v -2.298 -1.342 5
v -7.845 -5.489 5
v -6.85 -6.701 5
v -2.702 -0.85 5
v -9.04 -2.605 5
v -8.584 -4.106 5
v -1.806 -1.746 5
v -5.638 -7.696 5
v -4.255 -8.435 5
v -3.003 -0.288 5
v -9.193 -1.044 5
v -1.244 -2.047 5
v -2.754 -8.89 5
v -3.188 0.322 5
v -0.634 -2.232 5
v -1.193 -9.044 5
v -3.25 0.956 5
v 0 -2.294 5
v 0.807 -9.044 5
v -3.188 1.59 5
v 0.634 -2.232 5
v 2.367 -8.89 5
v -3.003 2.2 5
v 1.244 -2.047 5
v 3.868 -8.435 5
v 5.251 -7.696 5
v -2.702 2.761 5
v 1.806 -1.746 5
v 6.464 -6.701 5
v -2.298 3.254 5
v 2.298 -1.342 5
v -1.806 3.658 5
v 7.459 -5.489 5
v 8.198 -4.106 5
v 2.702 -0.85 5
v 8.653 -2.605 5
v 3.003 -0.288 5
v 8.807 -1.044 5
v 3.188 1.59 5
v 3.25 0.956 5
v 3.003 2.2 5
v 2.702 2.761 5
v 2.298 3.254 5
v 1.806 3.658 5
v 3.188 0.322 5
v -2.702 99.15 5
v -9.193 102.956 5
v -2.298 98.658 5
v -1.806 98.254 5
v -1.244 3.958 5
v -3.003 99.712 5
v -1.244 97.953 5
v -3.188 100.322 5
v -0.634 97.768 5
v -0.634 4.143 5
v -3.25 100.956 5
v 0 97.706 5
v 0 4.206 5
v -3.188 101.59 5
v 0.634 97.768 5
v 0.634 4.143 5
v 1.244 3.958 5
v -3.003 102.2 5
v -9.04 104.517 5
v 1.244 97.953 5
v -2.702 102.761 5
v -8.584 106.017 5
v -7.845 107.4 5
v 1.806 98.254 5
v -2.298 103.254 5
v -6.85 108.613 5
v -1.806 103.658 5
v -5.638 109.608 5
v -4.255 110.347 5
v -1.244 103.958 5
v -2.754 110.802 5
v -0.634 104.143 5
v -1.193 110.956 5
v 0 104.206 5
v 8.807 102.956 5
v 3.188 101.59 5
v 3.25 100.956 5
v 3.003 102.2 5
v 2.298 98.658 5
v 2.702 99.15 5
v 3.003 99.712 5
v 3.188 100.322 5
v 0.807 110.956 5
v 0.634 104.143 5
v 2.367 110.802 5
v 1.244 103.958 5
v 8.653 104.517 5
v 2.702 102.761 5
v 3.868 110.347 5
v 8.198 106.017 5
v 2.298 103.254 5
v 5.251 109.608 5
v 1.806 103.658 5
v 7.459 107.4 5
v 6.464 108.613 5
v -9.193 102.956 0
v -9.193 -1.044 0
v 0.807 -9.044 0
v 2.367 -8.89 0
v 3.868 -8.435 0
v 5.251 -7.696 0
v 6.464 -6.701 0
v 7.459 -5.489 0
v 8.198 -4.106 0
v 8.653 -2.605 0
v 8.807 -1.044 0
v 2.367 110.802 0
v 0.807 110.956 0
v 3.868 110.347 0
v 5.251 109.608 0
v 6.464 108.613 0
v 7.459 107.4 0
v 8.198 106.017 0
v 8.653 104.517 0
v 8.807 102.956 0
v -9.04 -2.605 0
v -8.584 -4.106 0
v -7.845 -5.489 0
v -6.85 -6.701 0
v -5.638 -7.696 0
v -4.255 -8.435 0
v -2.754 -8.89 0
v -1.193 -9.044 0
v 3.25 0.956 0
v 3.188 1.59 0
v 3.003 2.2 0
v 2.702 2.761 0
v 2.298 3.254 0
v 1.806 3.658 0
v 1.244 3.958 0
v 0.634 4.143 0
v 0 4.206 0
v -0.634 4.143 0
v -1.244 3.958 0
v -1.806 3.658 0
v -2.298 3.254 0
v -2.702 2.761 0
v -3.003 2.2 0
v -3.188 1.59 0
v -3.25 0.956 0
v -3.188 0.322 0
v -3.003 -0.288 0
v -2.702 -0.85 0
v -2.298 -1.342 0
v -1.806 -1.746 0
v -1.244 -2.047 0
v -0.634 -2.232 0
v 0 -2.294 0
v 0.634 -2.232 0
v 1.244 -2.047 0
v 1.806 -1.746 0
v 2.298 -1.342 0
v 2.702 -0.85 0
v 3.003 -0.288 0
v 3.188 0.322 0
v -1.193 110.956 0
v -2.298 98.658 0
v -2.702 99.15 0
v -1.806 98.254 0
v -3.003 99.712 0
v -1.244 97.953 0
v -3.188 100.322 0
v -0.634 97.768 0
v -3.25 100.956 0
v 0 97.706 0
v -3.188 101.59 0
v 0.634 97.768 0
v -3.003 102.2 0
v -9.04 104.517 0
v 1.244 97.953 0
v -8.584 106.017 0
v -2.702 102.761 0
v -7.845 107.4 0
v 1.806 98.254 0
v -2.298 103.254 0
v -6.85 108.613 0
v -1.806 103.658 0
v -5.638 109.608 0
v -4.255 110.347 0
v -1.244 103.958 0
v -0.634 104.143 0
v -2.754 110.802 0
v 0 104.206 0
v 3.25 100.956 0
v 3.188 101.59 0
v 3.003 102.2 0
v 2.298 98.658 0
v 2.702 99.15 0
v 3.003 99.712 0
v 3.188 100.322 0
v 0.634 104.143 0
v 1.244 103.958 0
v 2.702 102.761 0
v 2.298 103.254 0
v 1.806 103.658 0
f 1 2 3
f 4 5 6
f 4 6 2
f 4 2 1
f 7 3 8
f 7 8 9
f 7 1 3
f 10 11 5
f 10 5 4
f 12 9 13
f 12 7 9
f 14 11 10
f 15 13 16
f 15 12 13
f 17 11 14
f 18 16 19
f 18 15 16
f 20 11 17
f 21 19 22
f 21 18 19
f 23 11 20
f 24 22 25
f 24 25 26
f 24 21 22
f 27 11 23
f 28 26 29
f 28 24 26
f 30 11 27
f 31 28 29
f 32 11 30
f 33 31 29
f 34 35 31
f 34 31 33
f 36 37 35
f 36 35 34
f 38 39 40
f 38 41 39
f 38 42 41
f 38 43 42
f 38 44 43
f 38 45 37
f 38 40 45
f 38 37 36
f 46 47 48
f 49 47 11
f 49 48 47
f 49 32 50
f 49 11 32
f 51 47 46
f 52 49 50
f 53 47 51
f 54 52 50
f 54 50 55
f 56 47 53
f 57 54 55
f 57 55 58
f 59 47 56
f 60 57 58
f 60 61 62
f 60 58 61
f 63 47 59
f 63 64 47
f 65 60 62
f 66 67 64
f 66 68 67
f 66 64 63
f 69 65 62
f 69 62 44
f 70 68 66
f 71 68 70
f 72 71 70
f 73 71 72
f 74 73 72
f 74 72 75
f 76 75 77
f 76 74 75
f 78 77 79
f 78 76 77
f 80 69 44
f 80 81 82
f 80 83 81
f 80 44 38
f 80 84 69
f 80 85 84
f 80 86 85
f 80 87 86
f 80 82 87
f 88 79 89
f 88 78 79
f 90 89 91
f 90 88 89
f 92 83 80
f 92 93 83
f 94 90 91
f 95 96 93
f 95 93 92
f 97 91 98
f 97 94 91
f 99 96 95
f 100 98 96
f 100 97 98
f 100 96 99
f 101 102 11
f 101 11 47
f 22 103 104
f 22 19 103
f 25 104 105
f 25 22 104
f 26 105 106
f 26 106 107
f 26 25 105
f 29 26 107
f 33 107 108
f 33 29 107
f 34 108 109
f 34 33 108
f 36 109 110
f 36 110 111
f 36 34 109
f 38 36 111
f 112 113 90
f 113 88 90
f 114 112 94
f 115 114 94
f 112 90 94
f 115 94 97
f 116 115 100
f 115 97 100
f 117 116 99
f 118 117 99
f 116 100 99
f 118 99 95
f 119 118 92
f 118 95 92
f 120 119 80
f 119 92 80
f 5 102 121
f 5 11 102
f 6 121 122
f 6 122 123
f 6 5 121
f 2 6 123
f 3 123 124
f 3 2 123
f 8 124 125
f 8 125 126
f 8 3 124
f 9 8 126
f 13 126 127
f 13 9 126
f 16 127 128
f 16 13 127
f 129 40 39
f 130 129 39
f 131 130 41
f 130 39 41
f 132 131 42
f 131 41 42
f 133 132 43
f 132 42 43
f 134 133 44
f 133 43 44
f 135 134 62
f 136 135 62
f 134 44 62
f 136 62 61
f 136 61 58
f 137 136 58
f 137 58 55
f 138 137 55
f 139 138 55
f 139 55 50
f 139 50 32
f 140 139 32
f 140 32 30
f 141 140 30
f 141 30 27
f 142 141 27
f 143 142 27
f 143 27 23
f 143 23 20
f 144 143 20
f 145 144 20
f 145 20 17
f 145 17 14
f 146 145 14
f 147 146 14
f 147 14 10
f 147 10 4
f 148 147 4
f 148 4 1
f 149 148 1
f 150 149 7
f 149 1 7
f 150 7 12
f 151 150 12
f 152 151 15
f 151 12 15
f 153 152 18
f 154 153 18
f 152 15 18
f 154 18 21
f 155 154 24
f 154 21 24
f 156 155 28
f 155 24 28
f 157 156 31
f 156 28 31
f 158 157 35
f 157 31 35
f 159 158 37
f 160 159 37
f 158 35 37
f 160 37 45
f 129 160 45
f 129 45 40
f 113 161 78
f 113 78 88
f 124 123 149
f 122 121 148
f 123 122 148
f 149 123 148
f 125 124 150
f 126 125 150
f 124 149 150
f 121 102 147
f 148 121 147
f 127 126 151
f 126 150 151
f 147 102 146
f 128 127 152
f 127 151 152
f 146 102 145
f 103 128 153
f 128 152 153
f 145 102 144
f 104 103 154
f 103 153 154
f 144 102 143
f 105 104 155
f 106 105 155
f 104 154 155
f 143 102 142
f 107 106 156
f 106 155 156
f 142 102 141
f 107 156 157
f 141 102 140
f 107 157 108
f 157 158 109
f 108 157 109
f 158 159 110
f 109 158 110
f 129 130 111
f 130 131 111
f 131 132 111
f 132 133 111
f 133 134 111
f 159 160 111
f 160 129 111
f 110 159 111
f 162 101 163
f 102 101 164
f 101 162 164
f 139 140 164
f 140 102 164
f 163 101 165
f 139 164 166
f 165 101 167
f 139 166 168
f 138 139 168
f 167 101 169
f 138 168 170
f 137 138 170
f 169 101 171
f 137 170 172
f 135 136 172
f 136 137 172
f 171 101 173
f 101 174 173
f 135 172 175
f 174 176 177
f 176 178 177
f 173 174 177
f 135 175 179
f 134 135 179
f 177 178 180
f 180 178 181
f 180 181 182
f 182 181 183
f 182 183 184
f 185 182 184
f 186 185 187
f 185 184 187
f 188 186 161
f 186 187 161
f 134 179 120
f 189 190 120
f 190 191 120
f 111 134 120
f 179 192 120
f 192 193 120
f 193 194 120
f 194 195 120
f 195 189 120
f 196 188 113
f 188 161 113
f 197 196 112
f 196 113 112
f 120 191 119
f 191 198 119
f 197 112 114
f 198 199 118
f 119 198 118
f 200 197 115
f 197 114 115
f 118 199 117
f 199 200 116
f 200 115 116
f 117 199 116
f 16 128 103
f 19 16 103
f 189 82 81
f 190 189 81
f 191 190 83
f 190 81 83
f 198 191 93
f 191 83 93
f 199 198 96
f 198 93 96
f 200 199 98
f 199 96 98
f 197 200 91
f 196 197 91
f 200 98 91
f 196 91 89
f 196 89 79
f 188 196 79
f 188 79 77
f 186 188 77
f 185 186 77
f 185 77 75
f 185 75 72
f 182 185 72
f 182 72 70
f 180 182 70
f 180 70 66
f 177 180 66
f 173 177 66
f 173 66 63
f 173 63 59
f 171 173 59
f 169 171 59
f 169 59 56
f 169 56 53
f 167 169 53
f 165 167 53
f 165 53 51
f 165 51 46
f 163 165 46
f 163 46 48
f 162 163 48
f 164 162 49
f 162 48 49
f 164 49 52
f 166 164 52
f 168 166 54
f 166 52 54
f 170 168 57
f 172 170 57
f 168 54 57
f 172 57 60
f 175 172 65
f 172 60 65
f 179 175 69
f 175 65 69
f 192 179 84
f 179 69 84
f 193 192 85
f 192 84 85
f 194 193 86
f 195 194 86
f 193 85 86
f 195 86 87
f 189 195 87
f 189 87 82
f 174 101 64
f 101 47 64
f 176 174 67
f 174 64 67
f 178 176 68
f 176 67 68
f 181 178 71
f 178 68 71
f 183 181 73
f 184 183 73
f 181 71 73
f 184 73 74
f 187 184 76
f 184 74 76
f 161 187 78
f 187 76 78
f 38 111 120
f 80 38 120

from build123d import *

# Parameters (mm, degrees)
SKETCH_1_W          = 18
SKETCH_1_H          = 120
EXTRUDE_1_DEPTH     = 5
SKETCH_2_R          = 3.25
CUT_EXTRUDE_1_DEPTH = 30
FILLET_1_R          = 8


with BuildPart() as part:
    # 스케치1 → 보스-돌출1 (new body)
    with BuildSketch(Plane.XY):
        with Locations((-0.193251534, 50.955788216)):
            Rectangle(SKETCH_1_W, SKETCH_1_H)
    extrude(amount=EXTRUDE_1_DEPTH)

    # 스케치2 → 컷-돌출1 (cut)
    with BuildSketch(Plane.XY.offset(5)):
        with Locations((0, 100.955788216)):
            Circle(SKETCH_2_R)
        with Locations((0, 0.955788216)):
            Circle(SKETCH_2_R)
    extrude(amount=-CUT_EXTRUDE_1_DEPTH, mode=Mode.SUBTRACT)

    # 필렛1
    fillet_1_edges = [part.edges().sort_by_distance(p)[0] for p in [
        (-9.193251534, 110.955788216, 2.5),
        (-9.193251534, -9.044211784, 2.5),
        (8.806748466, -9.044211784, 2.5),
        (8.806748466, 110.955788216, 2.5),
    ]]
    fillet(fillet_1_edges, radius=FILLET_1_R)


solid = part.part
